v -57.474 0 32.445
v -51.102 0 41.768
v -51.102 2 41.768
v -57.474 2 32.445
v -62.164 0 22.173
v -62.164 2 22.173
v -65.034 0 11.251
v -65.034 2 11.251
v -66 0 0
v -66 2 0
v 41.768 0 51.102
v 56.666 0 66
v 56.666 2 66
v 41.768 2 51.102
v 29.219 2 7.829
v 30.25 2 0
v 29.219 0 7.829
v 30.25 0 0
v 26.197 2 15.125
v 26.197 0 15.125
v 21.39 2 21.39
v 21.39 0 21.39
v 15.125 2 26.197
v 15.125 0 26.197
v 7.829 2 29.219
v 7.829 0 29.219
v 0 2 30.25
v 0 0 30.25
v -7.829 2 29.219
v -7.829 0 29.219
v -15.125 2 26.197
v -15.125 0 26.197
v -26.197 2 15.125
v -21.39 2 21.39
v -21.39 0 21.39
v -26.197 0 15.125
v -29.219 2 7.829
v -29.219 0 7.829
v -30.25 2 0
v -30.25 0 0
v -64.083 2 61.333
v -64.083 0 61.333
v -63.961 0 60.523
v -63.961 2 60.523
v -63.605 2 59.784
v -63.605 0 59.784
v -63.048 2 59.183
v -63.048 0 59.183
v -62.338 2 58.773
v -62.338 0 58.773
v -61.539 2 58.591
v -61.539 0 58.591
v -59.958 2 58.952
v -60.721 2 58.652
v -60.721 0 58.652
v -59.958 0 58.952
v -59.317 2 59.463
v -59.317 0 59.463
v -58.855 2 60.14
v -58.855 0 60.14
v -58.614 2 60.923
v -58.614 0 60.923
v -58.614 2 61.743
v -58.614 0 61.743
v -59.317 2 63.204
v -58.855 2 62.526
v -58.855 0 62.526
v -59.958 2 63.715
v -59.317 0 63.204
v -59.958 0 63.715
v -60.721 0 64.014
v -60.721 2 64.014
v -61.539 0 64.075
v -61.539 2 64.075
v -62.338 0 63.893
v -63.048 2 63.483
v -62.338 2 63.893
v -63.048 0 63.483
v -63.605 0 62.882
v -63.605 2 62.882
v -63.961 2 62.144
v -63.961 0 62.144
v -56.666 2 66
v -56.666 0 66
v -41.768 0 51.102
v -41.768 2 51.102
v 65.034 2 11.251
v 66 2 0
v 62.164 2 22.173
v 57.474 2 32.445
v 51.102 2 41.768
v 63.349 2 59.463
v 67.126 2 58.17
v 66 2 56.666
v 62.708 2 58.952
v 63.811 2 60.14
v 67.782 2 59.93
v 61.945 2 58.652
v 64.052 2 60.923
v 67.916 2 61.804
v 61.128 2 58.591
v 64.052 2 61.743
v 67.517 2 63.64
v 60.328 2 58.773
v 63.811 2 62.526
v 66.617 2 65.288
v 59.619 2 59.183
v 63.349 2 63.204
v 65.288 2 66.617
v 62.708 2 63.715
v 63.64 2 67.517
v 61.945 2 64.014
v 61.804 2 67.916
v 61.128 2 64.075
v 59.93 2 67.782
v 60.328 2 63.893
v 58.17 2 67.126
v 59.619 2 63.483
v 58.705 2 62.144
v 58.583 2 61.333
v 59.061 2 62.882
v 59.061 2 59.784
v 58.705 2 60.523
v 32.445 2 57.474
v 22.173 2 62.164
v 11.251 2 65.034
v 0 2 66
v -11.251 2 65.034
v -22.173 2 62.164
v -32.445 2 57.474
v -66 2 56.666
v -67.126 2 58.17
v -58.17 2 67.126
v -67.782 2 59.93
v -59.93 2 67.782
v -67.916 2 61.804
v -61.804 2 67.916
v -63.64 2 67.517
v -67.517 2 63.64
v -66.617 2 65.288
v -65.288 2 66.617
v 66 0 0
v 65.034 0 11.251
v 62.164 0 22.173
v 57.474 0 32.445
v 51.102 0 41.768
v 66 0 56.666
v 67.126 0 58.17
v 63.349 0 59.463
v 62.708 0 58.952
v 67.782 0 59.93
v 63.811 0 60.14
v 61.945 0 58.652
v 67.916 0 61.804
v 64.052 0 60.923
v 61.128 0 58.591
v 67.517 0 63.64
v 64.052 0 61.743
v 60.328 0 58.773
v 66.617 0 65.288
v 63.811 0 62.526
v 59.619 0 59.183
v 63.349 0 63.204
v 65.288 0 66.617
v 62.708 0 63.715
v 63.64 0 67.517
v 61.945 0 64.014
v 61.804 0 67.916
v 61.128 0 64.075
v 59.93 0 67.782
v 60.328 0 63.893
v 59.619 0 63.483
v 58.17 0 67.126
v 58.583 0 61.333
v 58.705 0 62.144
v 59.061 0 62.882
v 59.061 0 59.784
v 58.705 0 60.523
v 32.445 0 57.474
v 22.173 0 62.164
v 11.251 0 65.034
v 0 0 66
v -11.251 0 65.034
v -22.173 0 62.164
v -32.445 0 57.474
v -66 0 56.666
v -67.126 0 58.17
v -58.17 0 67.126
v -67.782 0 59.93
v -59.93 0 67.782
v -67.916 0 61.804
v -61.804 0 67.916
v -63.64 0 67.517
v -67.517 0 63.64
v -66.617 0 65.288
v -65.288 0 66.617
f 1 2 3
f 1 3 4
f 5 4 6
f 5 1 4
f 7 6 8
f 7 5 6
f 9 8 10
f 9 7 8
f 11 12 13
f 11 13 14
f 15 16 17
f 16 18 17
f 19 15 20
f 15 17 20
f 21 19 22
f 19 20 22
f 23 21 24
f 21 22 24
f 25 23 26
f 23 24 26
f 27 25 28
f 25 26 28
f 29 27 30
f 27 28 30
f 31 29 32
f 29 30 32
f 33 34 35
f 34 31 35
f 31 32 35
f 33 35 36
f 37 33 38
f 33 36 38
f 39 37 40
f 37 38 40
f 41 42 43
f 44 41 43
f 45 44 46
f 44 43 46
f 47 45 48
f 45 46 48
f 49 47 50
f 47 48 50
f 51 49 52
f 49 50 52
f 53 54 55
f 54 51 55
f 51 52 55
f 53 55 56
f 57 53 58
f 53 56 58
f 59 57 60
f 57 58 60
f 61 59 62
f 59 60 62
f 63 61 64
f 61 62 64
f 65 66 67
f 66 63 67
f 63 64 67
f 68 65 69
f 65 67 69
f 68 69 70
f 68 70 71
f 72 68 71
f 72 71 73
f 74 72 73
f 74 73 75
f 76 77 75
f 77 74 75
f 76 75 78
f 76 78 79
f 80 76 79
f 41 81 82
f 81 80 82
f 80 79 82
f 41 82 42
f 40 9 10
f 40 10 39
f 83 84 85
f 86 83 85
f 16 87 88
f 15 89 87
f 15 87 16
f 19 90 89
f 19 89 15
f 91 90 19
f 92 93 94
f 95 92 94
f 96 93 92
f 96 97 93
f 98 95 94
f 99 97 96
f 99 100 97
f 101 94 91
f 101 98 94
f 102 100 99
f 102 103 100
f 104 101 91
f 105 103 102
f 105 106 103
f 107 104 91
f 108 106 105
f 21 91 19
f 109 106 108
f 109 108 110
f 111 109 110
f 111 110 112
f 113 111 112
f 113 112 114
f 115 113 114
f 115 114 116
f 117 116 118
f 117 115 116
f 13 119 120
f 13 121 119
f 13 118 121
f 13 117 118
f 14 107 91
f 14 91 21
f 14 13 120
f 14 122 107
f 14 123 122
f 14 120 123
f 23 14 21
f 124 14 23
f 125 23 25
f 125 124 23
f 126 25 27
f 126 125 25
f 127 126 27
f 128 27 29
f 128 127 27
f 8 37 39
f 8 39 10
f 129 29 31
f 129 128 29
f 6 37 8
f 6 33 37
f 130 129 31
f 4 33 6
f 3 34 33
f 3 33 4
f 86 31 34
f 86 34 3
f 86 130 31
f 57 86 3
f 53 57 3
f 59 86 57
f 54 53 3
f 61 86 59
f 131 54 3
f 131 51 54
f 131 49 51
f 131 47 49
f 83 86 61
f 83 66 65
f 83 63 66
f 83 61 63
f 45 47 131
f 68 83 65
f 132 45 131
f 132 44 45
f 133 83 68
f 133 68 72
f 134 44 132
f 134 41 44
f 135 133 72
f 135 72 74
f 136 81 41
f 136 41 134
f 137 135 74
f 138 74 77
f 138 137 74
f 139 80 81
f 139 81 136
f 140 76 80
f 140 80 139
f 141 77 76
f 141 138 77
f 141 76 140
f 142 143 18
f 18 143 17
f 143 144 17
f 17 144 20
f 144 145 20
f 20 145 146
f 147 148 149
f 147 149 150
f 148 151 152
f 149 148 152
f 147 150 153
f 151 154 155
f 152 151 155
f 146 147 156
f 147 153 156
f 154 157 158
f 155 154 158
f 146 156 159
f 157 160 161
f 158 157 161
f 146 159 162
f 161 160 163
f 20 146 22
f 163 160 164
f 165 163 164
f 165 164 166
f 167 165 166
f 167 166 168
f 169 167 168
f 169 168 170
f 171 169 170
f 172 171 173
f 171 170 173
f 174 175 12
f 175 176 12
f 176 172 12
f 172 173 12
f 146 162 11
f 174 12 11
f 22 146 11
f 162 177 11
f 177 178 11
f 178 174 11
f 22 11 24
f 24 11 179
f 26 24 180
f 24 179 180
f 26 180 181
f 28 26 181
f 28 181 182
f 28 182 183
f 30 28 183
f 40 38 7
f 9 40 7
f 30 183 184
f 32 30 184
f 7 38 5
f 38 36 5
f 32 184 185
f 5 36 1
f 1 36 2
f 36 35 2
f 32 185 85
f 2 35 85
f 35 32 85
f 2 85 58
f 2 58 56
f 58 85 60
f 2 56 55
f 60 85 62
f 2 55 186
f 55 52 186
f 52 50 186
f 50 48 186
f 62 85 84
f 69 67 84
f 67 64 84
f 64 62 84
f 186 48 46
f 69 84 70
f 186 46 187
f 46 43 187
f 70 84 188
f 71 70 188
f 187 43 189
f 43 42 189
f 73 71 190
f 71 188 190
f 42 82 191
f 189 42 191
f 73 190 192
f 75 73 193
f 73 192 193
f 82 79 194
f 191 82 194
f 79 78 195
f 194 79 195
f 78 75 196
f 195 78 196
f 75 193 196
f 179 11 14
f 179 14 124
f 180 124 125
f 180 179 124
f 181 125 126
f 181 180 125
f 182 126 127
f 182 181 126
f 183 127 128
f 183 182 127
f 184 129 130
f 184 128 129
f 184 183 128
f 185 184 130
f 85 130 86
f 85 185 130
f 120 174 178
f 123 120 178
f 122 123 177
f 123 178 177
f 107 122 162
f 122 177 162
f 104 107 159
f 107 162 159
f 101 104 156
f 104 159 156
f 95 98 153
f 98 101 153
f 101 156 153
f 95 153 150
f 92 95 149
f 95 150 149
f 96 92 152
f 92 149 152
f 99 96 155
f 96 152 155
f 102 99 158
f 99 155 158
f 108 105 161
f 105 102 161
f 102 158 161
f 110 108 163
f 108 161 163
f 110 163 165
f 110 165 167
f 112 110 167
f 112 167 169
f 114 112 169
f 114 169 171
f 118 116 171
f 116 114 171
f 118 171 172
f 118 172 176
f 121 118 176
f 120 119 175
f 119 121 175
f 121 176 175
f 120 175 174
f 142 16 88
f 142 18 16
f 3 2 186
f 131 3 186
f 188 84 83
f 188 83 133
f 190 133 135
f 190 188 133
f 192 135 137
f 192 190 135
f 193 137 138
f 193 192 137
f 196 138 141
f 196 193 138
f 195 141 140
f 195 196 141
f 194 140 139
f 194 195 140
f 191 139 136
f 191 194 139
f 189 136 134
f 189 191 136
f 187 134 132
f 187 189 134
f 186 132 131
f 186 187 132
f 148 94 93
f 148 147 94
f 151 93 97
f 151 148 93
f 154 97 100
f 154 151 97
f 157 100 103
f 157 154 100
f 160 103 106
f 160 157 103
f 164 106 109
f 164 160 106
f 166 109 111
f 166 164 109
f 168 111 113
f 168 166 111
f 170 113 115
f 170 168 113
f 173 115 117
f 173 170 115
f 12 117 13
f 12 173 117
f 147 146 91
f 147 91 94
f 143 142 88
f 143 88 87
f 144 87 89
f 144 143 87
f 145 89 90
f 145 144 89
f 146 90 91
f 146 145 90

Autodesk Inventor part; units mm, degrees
ref_plane "YZ Plane" through (0, 0, 0) normal (1, 0, 0) x (0, 1, 0)
ref_plane "XZ Plane" through (0, 0, 0) normal (0, 1, 0) x (-1, 0, 0)
ref_plane "XY Plane" through (0, 0, 0) normal (0, 0, 1) x (1, 0, 0)
sketch "Boceto1" plane through (0, 0, 0) normal (0, 1, 0) x (-1, 0, 0)
  arc A0 (30.25, 0) -> (-30.25, 0) centre (0, 0) ccw
  circle A1 centre (0, 0) radius 81.4 construction
  line L0 (66, 0) -> (30.25, 0)
  line L1 (-30.25, 0) -> (-66, 0)
  line L2 (0, 0) -> (103.5194, 0) construction
  line L3 (73.1993, 73.1993) -> (0, 0) construction
  line L4 (0, 0) -> (-73.1993, 73.1993) construction
  line L5 (0, 0) -> (103.5194, 0) construction
  line L6 (66, 66) -> (36.5996, 36.5996) construction
  line L7 (56.6662, 66) -> (41.7682, 51.102)
  line L8 (51.102, 41.7682) -> (66, 56.6662)
  arc A2 (66, 56.6662) -> (56.6662, 66) centre (61.3331, 61.3331) ccw
  line L9 (0, 0) -> (0, 91.3472) construction
  line L10 (-56.6662, 66) -> (-41.7682, 51.102)
  line L11 (-51.102, 41.7682) -> (-66, 56.6662)
  arc A3 (-56.6662, 66) -> (-66, 56.6662) centre (-61.3331, 61.3331) ccw
  circle A4 centre (61.3331, 61.3331) radius 2.75
  circle A5 centre (-61.3331, 61.3331) radius 2.75
  arc A6 (66, 0) -> (51.102, 41.7682) centre (0, 0) ccw
  arc A7 (41.7682, 51.102) -> (-41.7682, 51.102) centre (0, 0) ccw
  arc A8 (-51.102, 41.7682) -> (-66, 0) centre (0, 0) ccw
  point P0 (36.5996, 45.9334)
  point P1 (45.9334, 36.5996)
  point P2 (51.2998, 51.2998)
  point P3 (-36.5996, 45.9334)
  point P4 (-45.9334, 36.5996)
  dimension "d9" = 5.5
  dimension "d11" = 5.5
extrude "Extrusión2" add sketch "Boceto1" along normal blind 2
properties part number "Rail"
